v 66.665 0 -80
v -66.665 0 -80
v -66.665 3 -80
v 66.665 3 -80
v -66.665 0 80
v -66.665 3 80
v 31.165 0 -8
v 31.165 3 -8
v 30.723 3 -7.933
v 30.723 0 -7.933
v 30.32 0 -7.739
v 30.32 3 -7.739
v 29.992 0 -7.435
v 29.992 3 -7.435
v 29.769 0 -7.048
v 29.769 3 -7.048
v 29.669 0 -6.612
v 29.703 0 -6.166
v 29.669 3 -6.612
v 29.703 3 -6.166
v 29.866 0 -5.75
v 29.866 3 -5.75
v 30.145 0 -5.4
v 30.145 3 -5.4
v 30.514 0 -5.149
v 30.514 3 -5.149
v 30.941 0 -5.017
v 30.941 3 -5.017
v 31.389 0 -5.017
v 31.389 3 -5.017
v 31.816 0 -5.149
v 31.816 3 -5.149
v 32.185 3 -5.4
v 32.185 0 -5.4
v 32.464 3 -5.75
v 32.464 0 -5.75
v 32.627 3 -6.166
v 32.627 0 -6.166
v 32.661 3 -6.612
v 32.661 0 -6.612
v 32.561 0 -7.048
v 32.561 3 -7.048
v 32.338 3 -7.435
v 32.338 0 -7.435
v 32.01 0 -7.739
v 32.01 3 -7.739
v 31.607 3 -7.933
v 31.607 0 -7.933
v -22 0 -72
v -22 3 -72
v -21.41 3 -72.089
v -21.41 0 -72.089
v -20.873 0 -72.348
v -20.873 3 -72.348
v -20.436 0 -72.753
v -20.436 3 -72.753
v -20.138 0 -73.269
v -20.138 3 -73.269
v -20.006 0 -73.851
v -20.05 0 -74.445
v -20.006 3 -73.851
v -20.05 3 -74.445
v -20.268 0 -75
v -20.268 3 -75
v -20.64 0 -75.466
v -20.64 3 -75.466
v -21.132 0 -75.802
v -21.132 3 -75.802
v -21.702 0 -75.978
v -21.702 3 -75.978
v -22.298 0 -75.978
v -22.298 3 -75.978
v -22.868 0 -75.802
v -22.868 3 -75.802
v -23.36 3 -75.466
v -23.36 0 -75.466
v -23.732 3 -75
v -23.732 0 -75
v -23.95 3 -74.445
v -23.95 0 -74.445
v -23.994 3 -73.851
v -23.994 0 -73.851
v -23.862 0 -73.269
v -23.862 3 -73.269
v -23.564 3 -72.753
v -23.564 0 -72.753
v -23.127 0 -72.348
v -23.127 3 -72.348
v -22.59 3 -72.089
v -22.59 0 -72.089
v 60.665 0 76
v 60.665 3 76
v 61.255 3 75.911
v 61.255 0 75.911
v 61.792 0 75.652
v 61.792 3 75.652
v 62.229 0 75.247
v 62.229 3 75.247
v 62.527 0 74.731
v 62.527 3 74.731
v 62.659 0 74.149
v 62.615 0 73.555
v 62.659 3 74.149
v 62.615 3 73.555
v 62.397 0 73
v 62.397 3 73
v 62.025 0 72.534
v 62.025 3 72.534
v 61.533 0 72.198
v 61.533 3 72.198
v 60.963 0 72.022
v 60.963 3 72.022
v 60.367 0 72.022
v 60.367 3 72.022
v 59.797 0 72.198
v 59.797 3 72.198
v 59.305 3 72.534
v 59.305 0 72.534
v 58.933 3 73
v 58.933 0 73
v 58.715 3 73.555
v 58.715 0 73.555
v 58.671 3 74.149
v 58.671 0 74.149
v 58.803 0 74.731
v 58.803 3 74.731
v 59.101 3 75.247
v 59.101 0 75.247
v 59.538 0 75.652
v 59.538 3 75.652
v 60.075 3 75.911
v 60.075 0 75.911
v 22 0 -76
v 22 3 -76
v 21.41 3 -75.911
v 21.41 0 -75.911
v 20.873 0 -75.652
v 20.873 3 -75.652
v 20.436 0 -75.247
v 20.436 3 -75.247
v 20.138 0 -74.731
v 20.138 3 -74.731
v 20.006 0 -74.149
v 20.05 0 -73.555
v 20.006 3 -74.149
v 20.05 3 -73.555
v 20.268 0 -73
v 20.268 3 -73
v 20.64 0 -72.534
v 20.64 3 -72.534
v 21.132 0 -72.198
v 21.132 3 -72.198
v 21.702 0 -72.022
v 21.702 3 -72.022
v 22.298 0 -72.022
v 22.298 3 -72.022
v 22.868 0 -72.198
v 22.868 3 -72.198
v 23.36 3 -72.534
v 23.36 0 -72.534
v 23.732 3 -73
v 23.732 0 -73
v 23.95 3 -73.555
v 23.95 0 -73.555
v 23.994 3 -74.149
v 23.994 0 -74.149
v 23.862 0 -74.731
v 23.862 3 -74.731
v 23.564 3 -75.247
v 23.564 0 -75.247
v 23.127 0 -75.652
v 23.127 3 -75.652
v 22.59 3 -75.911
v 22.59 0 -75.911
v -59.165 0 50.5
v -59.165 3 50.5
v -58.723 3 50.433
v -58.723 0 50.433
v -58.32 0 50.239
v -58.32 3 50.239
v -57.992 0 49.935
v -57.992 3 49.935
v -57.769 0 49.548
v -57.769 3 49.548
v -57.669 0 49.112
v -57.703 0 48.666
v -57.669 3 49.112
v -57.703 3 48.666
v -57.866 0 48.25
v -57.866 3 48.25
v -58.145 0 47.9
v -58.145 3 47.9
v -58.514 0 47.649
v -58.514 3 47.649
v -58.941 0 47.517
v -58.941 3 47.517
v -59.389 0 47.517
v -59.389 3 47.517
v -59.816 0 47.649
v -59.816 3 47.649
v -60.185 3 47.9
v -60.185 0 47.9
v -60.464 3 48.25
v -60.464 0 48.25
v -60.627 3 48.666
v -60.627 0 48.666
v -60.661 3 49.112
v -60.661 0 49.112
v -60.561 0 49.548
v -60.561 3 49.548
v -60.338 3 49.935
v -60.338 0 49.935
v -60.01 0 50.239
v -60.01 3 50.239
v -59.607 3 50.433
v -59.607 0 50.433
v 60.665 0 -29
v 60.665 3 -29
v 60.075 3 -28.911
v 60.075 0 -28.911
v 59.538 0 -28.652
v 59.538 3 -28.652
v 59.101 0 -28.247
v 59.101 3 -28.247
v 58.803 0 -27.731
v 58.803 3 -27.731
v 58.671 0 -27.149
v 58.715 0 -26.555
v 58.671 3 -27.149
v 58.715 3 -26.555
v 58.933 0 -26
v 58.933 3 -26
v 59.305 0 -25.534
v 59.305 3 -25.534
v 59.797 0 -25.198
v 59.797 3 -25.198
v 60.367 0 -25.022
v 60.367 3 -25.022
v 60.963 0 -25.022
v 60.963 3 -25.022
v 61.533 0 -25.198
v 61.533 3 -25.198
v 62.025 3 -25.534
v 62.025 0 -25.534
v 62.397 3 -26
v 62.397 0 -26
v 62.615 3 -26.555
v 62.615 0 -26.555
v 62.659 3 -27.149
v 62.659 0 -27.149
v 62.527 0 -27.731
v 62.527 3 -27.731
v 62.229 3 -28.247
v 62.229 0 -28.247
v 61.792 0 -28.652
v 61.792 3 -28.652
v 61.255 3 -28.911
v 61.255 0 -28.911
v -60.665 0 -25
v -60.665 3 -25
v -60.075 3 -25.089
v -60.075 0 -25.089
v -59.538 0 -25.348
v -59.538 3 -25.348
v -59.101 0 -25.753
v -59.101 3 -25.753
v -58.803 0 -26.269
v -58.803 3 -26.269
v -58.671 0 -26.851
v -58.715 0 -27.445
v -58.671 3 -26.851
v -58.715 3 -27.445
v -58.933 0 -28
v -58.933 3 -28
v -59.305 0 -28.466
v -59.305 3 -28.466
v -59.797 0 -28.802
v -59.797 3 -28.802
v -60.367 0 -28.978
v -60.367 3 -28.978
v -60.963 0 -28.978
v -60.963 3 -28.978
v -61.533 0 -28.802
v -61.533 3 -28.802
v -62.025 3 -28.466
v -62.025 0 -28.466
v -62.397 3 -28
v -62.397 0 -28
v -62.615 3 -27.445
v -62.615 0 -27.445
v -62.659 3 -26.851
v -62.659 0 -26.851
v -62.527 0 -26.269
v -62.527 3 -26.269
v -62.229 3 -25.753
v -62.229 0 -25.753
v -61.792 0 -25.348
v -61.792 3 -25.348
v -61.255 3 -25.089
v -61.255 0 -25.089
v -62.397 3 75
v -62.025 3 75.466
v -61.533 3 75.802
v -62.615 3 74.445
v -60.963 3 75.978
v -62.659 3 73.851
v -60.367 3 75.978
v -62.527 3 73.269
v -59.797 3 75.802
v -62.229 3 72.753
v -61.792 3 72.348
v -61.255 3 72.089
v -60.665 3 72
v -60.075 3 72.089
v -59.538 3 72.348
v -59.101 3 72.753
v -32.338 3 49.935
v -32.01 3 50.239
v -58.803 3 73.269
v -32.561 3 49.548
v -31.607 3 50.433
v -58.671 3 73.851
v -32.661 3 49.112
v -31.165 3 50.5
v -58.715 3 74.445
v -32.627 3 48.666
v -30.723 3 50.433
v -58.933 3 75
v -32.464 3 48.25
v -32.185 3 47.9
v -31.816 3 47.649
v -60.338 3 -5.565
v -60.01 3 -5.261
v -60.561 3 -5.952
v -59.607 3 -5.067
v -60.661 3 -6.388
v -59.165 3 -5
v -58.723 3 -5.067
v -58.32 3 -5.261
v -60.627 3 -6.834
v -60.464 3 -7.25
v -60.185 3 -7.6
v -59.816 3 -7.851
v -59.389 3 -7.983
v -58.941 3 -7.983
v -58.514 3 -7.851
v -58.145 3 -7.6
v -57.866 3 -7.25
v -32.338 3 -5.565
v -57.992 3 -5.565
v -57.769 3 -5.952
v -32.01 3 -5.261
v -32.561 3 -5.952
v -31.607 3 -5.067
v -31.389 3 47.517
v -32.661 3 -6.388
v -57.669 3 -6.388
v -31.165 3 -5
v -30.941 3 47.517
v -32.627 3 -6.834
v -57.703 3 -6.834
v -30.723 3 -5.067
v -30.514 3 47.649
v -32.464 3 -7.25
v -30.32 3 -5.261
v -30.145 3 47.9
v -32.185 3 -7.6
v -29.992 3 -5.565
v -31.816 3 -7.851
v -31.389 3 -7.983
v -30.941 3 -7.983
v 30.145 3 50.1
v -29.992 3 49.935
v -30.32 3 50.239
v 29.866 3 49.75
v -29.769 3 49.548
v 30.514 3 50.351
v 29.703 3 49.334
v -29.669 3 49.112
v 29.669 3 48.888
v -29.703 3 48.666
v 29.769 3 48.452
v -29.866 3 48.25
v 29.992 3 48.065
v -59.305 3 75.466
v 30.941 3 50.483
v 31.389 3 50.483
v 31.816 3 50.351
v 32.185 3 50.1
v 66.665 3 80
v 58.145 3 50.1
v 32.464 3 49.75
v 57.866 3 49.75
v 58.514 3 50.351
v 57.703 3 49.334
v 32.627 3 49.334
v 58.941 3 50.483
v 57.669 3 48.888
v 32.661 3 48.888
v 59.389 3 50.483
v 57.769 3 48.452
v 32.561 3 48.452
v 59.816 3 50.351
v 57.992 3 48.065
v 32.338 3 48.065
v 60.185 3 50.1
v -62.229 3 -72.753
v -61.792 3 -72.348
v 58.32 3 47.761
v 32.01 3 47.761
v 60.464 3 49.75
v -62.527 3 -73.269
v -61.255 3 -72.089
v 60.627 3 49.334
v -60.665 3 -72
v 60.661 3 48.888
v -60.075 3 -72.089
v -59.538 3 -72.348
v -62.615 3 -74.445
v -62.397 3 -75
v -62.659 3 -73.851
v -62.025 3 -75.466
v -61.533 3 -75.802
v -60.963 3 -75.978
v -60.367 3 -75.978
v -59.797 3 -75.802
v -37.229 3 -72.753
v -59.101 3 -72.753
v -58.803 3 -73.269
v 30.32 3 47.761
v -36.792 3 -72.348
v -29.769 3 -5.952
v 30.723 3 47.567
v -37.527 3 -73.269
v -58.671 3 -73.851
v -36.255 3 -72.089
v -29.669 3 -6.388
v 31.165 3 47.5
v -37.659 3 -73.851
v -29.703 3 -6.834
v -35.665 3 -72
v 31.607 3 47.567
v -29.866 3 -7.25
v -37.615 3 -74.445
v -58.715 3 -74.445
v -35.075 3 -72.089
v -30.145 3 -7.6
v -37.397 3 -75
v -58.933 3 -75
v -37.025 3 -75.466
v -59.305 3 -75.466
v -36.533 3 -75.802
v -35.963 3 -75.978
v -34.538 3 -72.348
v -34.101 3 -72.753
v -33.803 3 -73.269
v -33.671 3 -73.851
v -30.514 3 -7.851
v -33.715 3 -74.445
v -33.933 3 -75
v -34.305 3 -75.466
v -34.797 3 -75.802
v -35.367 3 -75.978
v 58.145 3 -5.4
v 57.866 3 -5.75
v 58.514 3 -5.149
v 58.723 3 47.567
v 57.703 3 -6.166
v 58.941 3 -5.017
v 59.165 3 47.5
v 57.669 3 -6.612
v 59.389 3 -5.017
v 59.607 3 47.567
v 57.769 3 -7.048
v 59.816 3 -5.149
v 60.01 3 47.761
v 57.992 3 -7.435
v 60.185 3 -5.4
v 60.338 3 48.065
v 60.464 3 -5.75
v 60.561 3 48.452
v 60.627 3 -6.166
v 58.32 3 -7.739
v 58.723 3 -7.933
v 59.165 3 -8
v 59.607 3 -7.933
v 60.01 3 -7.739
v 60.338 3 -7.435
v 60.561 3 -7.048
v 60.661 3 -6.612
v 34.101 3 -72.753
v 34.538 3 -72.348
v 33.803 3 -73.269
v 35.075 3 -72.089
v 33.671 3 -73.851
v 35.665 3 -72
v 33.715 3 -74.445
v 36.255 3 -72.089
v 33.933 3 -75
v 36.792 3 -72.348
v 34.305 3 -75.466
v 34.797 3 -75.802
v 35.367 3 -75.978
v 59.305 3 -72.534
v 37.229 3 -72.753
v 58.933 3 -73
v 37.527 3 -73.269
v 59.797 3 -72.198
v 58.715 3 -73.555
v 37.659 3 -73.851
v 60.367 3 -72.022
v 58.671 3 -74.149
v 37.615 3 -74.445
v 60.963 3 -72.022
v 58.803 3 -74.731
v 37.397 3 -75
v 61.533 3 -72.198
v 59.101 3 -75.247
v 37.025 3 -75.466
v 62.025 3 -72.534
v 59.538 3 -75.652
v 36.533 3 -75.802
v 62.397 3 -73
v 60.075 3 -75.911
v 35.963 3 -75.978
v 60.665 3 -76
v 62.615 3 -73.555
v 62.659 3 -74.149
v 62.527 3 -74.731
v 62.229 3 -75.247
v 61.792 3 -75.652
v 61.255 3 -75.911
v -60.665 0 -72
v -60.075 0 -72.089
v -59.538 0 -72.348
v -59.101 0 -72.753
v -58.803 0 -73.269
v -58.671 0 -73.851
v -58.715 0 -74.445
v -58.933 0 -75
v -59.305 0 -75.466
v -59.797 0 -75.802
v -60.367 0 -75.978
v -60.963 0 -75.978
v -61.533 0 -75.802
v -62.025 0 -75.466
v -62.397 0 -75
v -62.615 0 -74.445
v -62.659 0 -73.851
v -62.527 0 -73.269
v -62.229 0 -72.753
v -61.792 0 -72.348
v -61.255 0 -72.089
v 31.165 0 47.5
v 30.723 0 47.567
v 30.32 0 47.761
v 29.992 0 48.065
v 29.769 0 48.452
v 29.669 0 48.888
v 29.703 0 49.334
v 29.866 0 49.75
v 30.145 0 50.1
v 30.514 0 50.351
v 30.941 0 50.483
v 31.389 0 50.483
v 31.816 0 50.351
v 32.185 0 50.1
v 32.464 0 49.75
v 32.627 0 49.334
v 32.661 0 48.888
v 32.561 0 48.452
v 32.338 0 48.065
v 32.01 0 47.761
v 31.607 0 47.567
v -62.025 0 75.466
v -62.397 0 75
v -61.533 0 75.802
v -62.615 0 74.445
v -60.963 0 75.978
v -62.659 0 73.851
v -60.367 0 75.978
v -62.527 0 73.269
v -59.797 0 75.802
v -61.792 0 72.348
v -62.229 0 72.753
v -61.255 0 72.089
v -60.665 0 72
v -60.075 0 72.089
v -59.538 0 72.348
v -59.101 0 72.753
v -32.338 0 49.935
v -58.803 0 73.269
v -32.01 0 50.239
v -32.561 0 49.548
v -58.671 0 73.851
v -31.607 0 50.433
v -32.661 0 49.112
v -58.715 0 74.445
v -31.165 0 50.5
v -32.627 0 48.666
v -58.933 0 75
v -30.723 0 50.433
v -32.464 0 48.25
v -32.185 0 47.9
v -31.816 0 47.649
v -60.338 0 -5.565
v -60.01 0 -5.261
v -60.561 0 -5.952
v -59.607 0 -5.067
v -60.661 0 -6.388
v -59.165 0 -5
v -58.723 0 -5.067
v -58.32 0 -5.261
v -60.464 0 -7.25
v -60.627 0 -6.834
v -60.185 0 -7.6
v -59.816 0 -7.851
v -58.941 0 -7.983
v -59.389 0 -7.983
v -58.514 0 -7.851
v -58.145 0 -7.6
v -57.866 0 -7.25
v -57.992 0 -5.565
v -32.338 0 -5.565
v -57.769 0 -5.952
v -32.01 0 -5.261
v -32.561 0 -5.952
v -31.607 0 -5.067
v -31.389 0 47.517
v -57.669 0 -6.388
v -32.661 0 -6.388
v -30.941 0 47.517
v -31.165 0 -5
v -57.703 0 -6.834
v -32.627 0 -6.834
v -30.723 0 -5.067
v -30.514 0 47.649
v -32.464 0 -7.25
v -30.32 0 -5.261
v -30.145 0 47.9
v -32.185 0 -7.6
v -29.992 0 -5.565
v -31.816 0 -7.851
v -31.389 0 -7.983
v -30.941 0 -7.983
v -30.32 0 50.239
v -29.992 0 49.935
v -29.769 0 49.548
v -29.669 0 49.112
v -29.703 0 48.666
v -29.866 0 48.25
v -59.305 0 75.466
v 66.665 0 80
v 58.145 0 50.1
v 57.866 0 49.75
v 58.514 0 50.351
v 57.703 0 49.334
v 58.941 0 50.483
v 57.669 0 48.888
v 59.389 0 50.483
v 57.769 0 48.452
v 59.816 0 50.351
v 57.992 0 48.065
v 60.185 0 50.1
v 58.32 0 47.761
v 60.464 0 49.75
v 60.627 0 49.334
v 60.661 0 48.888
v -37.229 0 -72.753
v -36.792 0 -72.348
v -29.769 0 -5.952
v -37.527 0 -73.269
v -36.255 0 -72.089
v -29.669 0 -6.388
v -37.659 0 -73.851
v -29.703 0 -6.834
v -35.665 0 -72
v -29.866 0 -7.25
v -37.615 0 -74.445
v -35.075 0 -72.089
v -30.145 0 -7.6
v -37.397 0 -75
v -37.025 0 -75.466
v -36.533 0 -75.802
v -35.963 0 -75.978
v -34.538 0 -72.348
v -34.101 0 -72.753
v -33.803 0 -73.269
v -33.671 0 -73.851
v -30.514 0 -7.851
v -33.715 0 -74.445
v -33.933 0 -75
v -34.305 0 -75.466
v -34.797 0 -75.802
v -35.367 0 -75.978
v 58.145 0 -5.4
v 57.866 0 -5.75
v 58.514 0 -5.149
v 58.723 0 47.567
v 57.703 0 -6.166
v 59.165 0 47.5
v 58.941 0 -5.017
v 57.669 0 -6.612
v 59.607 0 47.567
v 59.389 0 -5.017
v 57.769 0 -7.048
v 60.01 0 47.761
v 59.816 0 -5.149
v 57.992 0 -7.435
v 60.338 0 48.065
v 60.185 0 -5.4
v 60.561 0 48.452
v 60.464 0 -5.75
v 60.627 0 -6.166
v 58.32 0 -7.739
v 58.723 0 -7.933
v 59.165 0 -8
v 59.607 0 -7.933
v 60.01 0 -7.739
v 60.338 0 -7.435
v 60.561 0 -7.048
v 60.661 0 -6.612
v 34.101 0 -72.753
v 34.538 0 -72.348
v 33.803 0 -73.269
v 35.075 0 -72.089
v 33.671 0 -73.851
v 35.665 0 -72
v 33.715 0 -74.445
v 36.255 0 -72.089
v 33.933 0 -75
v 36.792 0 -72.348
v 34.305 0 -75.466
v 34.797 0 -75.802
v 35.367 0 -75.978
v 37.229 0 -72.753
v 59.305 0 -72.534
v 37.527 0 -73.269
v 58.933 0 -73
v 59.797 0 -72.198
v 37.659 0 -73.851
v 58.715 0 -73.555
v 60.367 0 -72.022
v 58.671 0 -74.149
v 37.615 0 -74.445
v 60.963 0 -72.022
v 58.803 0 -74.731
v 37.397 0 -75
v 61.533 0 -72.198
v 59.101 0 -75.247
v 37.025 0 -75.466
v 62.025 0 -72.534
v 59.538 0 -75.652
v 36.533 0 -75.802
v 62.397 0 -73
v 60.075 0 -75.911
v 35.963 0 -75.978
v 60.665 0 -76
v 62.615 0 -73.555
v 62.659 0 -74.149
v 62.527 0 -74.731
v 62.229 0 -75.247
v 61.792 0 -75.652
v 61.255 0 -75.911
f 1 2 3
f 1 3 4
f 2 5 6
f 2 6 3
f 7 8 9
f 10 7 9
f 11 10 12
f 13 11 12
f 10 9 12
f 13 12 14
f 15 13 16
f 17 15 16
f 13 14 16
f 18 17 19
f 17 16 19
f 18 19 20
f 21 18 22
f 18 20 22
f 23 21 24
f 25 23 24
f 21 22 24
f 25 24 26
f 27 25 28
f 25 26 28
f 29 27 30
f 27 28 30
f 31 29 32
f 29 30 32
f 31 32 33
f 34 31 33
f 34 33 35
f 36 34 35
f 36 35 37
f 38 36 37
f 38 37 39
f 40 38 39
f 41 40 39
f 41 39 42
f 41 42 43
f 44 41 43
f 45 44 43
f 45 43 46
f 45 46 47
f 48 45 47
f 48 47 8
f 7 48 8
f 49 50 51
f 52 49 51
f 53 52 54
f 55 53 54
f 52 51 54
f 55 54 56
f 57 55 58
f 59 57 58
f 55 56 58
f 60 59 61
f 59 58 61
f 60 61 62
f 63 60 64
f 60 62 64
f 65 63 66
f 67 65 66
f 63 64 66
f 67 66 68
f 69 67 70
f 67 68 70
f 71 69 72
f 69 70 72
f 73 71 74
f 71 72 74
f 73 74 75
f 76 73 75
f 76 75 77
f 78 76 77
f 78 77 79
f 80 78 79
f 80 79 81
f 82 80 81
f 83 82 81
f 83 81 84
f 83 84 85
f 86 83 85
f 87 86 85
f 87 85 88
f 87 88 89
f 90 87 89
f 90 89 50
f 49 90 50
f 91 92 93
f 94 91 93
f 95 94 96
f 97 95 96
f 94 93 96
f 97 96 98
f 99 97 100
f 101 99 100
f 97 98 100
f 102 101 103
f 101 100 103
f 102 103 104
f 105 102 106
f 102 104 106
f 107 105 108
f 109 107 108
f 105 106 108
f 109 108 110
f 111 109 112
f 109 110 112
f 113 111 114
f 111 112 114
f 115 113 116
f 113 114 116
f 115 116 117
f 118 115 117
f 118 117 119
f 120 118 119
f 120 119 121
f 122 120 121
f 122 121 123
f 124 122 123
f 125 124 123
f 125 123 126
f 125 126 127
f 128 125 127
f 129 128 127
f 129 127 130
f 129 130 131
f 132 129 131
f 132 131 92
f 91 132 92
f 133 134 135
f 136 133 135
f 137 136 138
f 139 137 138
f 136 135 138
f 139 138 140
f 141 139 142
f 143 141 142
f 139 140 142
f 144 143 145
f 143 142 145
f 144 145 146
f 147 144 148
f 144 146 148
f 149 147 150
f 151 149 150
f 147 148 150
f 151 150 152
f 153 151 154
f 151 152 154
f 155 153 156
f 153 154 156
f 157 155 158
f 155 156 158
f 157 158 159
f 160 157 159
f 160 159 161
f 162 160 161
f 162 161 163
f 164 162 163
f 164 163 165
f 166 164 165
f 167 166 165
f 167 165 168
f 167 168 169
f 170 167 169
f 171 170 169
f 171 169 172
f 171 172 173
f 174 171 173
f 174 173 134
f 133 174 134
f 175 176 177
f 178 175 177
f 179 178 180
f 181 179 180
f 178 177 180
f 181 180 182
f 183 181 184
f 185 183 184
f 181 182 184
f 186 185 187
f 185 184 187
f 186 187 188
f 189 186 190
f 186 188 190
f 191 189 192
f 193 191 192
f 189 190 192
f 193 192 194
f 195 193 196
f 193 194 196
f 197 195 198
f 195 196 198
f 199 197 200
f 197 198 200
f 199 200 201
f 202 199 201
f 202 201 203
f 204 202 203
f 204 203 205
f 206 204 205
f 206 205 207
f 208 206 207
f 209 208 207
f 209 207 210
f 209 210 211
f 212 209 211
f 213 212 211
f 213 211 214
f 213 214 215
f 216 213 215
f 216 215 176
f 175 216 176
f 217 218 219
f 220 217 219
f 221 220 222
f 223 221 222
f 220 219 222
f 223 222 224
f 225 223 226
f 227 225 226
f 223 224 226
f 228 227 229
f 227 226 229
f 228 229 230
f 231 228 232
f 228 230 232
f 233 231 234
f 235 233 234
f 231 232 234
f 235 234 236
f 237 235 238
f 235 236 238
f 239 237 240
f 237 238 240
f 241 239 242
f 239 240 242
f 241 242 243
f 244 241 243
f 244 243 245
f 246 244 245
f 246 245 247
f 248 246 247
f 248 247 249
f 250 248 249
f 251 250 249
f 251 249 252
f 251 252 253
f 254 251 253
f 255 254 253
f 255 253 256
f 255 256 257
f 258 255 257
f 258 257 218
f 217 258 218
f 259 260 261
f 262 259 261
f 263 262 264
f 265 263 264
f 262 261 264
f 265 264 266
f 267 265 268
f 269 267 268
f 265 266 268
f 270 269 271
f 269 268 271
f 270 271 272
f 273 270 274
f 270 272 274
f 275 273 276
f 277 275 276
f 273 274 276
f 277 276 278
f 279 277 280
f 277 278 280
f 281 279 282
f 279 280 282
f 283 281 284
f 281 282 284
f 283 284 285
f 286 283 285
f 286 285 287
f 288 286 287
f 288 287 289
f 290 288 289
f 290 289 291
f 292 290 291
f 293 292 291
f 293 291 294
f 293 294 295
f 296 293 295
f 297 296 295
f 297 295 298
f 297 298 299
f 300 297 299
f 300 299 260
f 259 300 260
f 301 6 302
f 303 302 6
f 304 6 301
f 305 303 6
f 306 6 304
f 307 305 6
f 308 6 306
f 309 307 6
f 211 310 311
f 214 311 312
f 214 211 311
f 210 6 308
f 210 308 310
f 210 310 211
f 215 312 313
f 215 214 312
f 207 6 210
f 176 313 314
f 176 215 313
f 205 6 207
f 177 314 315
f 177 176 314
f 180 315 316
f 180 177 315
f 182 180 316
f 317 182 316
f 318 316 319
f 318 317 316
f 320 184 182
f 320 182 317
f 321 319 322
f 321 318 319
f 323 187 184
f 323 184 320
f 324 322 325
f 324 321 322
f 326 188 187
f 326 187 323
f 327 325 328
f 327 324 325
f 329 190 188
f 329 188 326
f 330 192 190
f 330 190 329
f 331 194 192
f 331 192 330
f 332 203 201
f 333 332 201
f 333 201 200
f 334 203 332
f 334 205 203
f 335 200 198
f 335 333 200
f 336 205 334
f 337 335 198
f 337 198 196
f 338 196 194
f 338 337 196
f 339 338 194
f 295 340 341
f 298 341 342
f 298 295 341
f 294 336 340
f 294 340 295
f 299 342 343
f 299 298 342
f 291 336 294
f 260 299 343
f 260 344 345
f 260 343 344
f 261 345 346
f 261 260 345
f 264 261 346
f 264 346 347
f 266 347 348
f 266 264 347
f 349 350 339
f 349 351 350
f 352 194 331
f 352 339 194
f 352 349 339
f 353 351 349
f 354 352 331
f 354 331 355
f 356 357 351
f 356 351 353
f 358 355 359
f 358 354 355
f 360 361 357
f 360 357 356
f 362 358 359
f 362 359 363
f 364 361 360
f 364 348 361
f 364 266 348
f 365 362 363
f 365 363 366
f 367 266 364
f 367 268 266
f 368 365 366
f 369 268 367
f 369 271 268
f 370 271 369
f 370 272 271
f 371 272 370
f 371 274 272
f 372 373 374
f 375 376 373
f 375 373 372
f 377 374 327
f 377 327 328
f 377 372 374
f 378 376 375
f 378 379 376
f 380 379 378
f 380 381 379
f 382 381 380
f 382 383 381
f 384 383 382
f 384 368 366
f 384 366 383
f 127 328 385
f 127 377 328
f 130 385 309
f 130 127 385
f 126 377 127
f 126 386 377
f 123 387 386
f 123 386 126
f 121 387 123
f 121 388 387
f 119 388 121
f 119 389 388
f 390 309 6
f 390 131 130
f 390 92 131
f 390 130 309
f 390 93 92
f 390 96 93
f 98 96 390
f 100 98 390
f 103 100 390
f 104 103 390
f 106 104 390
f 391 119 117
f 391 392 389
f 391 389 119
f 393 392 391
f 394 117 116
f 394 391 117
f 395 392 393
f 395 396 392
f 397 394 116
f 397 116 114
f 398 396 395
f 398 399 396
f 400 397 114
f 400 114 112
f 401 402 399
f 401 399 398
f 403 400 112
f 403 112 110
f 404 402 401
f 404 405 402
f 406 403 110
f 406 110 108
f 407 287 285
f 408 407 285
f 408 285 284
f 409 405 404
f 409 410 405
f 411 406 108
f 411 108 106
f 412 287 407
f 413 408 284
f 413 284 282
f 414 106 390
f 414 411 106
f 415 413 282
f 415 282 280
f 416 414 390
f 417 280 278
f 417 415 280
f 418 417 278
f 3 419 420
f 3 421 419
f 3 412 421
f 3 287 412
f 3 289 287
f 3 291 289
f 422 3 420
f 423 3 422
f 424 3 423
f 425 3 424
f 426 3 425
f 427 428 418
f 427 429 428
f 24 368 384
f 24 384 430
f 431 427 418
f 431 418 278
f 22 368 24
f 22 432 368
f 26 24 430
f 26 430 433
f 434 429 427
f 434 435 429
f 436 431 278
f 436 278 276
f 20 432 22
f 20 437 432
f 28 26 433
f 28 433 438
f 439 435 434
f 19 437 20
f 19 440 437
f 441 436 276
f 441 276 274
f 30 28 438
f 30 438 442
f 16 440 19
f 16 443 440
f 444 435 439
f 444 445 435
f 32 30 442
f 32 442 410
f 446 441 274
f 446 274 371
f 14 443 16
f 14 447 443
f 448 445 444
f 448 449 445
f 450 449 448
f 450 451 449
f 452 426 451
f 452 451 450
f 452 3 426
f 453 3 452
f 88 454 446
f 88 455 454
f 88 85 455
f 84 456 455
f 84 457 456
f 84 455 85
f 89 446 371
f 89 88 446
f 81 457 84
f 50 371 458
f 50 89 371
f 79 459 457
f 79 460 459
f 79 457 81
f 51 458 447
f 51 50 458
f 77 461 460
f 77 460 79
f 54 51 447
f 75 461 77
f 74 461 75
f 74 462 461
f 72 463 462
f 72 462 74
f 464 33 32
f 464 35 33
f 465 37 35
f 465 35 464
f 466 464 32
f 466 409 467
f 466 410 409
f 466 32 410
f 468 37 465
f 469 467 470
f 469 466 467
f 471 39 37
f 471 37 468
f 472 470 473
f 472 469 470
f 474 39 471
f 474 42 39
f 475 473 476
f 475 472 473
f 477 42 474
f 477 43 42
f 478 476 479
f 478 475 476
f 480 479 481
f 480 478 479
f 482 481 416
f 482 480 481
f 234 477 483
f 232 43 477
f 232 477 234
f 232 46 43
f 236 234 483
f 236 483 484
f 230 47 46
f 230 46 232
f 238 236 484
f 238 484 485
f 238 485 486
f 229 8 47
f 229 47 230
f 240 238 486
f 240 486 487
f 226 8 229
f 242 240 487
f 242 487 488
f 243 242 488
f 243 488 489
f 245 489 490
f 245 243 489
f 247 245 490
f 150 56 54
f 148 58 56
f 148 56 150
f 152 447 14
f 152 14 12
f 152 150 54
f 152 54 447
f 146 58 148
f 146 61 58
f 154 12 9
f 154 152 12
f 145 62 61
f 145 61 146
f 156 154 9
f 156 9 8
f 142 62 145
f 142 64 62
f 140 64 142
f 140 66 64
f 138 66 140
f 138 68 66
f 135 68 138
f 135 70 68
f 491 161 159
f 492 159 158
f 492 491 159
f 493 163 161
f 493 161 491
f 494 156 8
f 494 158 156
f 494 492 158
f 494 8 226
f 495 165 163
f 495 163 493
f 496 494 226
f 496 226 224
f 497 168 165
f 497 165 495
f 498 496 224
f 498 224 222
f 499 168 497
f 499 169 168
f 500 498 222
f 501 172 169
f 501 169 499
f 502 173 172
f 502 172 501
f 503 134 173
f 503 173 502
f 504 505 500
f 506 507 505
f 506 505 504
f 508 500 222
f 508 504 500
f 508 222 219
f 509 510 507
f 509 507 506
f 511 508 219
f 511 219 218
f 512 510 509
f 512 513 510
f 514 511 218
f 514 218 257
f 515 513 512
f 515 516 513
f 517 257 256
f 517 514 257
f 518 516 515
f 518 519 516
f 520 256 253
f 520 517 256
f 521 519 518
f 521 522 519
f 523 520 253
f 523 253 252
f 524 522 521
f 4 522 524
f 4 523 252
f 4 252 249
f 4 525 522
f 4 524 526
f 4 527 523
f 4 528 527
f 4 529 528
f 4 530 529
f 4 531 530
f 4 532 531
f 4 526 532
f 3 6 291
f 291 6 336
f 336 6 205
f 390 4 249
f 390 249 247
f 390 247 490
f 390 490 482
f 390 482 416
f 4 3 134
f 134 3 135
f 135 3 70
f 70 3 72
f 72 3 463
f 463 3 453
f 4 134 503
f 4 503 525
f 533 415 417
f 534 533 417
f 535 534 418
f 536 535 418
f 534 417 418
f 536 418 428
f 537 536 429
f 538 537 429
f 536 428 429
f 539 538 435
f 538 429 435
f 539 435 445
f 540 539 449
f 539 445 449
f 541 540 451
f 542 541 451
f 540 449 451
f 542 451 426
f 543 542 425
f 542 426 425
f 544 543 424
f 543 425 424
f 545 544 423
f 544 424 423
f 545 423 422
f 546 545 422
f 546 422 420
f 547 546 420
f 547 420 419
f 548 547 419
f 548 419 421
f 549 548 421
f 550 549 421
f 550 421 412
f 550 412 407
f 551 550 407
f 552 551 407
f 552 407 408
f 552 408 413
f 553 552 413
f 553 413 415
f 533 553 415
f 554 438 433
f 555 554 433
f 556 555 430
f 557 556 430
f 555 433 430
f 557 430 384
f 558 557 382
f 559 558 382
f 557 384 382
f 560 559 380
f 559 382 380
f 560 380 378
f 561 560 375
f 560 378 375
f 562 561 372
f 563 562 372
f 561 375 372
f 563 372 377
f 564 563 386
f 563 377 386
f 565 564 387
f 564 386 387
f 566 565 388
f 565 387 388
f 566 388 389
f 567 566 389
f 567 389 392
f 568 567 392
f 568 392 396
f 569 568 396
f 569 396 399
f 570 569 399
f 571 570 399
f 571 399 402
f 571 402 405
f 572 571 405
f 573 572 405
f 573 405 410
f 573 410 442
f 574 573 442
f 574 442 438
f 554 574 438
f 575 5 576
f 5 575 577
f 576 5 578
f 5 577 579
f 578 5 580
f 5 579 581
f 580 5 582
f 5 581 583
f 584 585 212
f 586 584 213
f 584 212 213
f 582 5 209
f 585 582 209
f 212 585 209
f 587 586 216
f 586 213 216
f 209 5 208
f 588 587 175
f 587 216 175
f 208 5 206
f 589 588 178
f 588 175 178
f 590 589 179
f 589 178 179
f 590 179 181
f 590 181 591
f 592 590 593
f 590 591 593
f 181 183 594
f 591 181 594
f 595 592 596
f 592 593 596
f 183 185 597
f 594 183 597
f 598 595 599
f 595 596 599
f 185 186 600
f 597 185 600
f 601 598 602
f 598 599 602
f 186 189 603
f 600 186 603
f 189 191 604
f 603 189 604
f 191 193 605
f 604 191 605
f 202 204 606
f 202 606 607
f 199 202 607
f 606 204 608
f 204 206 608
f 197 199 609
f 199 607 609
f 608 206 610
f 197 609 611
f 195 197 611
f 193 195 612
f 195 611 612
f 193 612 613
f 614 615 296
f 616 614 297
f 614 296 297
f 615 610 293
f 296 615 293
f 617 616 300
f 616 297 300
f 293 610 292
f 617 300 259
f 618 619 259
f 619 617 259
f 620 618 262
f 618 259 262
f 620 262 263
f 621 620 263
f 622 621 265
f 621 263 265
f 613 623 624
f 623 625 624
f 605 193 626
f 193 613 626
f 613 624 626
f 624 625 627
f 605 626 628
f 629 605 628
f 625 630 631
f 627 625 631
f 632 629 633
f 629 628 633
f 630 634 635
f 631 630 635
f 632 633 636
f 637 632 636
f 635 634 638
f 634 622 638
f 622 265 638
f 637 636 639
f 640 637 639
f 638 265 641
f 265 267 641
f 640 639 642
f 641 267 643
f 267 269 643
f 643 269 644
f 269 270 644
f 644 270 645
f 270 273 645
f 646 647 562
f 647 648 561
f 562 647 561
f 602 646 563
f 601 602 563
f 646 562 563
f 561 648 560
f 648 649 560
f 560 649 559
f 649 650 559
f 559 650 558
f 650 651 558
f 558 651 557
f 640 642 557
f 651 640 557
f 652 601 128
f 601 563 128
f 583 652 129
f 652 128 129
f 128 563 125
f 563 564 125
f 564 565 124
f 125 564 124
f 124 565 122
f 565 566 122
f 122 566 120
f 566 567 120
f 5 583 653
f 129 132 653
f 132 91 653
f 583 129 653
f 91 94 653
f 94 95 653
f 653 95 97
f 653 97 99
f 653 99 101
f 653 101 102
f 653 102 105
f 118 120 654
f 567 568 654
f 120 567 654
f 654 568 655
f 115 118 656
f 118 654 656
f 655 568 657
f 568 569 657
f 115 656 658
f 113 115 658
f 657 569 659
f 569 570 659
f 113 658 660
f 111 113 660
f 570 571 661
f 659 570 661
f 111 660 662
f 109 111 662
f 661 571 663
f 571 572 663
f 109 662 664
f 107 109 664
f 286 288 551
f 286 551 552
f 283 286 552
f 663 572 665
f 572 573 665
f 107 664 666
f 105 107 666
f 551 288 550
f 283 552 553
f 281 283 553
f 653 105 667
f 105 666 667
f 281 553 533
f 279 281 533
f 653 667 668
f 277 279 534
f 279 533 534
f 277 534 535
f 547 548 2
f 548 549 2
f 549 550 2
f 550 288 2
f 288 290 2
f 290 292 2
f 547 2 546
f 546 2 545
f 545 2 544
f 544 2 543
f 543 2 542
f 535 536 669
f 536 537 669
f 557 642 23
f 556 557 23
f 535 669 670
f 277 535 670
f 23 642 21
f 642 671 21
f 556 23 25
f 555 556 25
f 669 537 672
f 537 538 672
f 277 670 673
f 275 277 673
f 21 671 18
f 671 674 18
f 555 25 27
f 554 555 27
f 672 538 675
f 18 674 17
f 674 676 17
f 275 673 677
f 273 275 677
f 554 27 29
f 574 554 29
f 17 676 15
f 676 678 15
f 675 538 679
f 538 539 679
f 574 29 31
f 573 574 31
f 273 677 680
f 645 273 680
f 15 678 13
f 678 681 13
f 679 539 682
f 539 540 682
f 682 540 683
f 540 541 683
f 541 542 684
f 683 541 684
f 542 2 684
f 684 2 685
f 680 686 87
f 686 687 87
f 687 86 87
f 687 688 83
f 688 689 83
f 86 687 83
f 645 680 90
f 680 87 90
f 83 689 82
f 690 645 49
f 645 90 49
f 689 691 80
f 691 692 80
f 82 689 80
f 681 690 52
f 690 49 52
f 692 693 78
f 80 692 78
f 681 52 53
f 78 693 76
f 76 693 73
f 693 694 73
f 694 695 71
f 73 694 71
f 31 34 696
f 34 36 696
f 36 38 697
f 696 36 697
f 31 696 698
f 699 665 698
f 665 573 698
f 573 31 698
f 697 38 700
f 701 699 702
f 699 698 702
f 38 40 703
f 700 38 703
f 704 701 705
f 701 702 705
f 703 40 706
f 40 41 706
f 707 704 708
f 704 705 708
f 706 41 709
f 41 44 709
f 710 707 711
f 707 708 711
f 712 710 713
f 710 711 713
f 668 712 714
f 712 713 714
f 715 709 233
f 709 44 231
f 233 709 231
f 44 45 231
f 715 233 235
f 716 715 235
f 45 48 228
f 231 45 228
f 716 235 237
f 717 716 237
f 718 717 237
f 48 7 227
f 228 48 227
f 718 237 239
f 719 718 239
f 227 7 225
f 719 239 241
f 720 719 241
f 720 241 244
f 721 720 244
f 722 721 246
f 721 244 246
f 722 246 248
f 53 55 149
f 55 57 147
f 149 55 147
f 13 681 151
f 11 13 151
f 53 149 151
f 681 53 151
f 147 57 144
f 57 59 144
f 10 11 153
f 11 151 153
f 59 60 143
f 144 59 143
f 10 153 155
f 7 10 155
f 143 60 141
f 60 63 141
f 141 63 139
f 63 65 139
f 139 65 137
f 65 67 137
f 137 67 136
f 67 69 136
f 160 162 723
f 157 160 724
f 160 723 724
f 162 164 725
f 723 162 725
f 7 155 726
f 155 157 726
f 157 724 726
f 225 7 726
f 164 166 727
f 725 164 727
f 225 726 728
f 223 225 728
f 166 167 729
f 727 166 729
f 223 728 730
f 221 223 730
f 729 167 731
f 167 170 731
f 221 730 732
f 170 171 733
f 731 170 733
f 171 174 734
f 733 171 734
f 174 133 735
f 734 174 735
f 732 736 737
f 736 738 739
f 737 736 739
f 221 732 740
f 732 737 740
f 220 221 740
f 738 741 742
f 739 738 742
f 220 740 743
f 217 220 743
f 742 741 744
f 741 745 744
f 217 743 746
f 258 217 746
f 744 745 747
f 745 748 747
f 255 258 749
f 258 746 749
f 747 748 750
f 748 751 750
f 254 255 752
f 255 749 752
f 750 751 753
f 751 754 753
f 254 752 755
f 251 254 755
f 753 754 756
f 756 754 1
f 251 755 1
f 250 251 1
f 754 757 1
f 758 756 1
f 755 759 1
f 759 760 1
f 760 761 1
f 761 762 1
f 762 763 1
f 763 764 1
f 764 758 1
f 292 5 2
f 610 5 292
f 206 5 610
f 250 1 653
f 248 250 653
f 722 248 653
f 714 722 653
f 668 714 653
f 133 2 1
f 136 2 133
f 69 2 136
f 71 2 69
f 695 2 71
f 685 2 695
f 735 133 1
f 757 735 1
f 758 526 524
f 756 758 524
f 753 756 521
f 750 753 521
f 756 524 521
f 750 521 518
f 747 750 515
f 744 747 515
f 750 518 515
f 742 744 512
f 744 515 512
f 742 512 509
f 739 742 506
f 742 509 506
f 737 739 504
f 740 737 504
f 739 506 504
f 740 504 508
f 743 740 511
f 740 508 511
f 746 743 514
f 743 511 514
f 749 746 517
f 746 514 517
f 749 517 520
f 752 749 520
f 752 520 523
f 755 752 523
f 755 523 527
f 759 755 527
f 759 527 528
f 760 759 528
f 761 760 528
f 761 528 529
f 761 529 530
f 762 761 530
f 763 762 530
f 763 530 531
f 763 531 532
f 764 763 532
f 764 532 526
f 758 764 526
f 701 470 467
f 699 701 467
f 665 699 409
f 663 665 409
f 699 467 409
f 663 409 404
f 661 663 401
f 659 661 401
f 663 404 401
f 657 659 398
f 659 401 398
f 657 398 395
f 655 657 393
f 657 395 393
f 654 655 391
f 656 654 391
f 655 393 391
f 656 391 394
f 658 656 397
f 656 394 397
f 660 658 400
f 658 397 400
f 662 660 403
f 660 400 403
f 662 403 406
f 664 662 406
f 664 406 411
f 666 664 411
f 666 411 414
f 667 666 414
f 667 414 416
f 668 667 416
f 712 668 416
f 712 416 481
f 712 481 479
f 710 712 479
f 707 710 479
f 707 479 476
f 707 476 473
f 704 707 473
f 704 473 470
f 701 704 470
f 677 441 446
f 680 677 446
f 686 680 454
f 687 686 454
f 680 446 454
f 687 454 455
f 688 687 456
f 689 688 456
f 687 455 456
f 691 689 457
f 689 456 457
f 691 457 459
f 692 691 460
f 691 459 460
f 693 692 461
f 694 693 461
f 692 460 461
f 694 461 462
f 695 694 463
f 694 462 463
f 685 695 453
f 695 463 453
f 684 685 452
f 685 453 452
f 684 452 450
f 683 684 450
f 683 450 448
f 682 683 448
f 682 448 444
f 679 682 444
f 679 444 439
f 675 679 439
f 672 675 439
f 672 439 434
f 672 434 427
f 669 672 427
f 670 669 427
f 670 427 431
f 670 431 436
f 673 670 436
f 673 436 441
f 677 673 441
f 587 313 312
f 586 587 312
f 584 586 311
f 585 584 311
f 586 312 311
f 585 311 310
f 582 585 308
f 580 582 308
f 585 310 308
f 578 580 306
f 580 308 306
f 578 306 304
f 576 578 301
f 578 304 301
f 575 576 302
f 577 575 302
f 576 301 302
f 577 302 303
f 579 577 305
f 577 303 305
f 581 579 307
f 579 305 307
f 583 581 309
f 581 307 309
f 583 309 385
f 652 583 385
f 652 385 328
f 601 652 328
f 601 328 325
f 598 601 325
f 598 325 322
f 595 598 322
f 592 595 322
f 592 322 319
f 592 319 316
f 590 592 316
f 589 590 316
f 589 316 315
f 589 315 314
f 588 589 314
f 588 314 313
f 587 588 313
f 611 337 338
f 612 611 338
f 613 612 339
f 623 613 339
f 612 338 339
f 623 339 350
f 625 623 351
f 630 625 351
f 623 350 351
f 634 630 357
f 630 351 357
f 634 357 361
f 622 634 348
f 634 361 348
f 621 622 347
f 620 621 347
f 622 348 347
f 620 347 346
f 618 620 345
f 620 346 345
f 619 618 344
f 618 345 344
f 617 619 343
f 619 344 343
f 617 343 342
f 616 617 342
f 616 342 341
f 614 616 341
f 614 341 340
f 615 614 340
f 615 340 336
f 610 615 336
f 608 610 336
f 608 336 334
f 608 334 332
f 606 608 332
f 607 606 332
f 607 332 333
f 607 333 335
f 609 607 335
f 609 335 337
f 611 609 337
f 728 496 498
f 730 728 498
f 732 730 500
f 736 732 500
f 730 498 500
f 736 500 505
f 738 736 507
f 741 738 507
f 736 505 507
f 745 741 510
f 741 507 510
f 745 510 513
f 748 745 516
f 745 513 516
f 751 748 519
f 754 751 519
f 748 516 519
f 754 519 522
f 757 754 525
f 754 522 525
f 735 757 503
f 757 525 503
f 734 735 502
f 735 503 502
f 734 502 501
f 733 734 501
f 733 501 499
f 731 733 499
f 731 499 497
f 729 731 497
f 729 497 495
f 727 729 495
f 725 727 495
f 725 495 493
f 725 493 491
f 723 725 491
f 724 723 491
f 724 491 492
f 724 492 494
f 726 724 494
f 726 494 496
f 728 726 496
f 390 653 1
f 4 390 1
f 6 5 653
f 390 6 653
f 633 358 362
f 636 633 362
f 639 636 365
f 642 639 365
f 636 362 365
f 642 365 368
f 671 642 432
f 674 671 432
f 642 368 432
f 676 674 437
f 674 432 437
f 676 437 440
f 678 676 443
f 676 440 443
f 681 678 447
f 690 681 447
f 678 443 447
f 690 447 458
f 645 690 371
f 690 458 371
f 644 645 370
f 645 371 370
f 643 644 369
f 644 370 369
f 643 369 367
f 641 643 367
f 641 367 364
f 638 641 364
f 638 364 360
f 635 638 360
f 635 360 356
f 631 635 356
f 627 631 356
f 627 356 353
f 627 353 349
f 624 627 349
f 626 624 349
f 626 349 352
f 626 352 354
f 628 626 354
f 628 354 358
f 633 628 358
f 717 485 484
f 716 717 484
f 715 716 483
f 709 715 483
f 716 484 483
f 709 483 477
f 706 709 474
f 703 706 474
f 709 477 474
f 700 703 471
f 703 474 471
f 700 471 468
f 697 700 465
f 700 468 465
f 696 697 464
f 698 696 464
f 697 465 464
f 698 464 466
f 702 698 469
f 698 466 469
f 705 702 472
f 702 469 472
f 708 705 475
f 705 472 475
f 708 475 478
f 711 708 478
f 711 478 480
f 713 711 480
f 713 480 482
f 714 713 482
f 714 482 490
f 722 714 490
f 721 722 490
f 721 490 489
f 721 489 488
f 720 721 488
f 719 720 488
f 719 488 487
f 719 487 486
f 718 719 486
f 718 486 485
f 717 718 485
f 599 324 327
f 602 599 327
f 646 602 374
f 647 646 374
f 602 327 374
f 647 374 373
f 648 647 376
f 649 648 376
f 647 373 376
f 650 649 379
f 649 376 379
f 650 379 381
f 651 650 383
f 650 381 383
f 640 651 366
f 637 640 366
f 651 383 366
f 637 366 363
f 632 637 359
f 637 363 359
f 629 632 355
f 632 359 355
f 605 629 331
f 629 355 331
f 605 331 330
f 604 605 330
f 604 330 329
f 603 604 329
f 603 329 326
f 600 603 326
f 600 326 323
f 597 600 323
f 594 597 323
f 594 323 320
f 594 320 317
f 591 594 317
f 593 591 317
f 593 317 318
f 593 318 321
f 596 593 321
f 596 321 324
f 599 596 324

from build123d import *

# Parameters (mm, degrees)
ESQUISSE1_W             = 133.33
ESQUISSE1_H             = 160
BOSS_EXTRU_1_DEPTH      = 3
ESQUISSE2_R             = 2
ENL_V_MAT_EXTRU_1_DEPTH = 105.178799307
ESQUISSE3_R             = 2
ESQUISSE3_R_2           = 1.5
ENL_V_MAT_EXTRU_2_DEPTH = 105.178799307
ESQUISSE4_R             = 2
ENL_V_MAT_EXTRU_3_DEPTH = 3.175
ESQUISSE5_R             = 2
ENL_V_MAT_EXTRU_4_DEPTH = 105.178799307


with BuildPart() as part:
    # Esquisse1 → Boss.-Extru.1 (new body)
    with BuildSketch(Plane(origin=(0, 0, 0), x_dir=(1, 0, 0), z_dir=(0, 1, 0))):
        Rectangle(ESQUISSE1_W, ESQUISSE1_H)
    extrude(amount=BOSS_EXTRU_1_DEPTH)

    # Esquisse2 → Enlèv. mat.-Extru.1 (cut, through all)
    with BuildSketch(Plane(origin=(0, 3, 0), x_dir=(1, 0, 0), z_dir=(0, 1, 0))):
        with Locations(Location((-60.665, 74, 0), (0, 0, 270))):
            Circle(ESQUISSE2_R)
        with Locations(Location((60.665, 74, 0), (0, 0, 90))):
            Circle(ESQUISSE2_R)
        with Locations(Location((60.665, -74, 0), (0, 0, 270))):
            Circle(ESQUISSE2_R)
        with Locations(Location((-60.665, -74, 0), (0, 0, 90))):
            Circle(ESQUISSE2_R)
    extrude(amount=-ENL_V_MAT_EXTRU_1_DEPTH, mode=Mode.SUBTRACT)

    # Esquisse3 → Enlèv. mat.-Extru.2 (cut, through all)
    with BuildSketch(Plane(origin=(0, 3, 0), x_dir=(1, 0, 0), z_dir=(0, 1, 0))):
        with Locations(Location((-60.665, 27, 0), (0, 0, 270))):
            Circle(ESQUISSE3_R)
        with Locations(Location((60.665, 27, 0), (0, 0, 90))):
            Circle(ESQUISSE3_R)
        with Locations(Location((-59.165, 6.5, 0), (0, 0, 270))):
            Circle(ESQUISSE3_R_2)
        with Locations(Location((-31.165, 6.5, 0), (0, 0, 270))):
            Circle(ESQUISSE3_R_2)
        with Locations(Location((-59.165, -49, 0), (0, 0, 270))):
            Circle(ESQUISSE3_R_2)
        with Locations(Location((-31.165, -49, 0), (0, 0, 270))):
            Circle(ESQUISSE3_R_2)
        with Locations(Location((31.165, -49, 0), (0, 0, 90))):
            Circle(ESQUISSE3_R_2)
        with Locations(Location((59.165, -49, 0), (0, 0, 90))):
            Circle(ESQUISSE3_R_2)
        with Locations(Location((59.165, 6.5, 0), (0, 0, 90))):
            Circle(ESQUISSE3_R_2)
        with Locations(Location((31.165, 6.5, 0), (0, 0, 90))):
            Circle(ESQUISSE3_R_2)
    extrude(amount=-ENL_V_MAT_EXTRU_2_DEPTH, mode=Mode.SUBTRACT)

    # Esquisse4 → Enlèv. mat.-Extru.3 (cut)
    with BuildSketch(Plane(origin=(0, 3, 0), x_dir=(1, 0, 0), z_dir=(0, 1, 0))):
        with Locations(Location((-35.665, 74, 0), (0, 0, 270))):
            Circle(ESQUISSE4_R)
        with Locations(Location((35.665, 74, 0), (0, 0, 270))):
            Circle(ESQUISSE4_R)
    extrude(amount=-ENL_V_MAT_EXTRU_3_DEPTH, mode=Mode.SUBTRACT)

    # Esquisse5 → Enlèv. mat.-Extru.4 (cut, through all)
    with BuildSketch(Plane(origin=(0, 3, 0), x_dir=(1, 0, 0), z_dir=(0, 1, 0))):
        with Locations(Location((-22, 74, 0), (0, 0, 270))):
            Circle(ESQUISSE5_R)
        with Locations(Location((22, 74, 0), (0, 0, 90))):
            Circle(ESQUISSE5_R)
    extrude(amount=-ENL_V_MAT_EXTRU_4_DEPTH, mode=Mode.SUBTRACT)


solid = part.part
